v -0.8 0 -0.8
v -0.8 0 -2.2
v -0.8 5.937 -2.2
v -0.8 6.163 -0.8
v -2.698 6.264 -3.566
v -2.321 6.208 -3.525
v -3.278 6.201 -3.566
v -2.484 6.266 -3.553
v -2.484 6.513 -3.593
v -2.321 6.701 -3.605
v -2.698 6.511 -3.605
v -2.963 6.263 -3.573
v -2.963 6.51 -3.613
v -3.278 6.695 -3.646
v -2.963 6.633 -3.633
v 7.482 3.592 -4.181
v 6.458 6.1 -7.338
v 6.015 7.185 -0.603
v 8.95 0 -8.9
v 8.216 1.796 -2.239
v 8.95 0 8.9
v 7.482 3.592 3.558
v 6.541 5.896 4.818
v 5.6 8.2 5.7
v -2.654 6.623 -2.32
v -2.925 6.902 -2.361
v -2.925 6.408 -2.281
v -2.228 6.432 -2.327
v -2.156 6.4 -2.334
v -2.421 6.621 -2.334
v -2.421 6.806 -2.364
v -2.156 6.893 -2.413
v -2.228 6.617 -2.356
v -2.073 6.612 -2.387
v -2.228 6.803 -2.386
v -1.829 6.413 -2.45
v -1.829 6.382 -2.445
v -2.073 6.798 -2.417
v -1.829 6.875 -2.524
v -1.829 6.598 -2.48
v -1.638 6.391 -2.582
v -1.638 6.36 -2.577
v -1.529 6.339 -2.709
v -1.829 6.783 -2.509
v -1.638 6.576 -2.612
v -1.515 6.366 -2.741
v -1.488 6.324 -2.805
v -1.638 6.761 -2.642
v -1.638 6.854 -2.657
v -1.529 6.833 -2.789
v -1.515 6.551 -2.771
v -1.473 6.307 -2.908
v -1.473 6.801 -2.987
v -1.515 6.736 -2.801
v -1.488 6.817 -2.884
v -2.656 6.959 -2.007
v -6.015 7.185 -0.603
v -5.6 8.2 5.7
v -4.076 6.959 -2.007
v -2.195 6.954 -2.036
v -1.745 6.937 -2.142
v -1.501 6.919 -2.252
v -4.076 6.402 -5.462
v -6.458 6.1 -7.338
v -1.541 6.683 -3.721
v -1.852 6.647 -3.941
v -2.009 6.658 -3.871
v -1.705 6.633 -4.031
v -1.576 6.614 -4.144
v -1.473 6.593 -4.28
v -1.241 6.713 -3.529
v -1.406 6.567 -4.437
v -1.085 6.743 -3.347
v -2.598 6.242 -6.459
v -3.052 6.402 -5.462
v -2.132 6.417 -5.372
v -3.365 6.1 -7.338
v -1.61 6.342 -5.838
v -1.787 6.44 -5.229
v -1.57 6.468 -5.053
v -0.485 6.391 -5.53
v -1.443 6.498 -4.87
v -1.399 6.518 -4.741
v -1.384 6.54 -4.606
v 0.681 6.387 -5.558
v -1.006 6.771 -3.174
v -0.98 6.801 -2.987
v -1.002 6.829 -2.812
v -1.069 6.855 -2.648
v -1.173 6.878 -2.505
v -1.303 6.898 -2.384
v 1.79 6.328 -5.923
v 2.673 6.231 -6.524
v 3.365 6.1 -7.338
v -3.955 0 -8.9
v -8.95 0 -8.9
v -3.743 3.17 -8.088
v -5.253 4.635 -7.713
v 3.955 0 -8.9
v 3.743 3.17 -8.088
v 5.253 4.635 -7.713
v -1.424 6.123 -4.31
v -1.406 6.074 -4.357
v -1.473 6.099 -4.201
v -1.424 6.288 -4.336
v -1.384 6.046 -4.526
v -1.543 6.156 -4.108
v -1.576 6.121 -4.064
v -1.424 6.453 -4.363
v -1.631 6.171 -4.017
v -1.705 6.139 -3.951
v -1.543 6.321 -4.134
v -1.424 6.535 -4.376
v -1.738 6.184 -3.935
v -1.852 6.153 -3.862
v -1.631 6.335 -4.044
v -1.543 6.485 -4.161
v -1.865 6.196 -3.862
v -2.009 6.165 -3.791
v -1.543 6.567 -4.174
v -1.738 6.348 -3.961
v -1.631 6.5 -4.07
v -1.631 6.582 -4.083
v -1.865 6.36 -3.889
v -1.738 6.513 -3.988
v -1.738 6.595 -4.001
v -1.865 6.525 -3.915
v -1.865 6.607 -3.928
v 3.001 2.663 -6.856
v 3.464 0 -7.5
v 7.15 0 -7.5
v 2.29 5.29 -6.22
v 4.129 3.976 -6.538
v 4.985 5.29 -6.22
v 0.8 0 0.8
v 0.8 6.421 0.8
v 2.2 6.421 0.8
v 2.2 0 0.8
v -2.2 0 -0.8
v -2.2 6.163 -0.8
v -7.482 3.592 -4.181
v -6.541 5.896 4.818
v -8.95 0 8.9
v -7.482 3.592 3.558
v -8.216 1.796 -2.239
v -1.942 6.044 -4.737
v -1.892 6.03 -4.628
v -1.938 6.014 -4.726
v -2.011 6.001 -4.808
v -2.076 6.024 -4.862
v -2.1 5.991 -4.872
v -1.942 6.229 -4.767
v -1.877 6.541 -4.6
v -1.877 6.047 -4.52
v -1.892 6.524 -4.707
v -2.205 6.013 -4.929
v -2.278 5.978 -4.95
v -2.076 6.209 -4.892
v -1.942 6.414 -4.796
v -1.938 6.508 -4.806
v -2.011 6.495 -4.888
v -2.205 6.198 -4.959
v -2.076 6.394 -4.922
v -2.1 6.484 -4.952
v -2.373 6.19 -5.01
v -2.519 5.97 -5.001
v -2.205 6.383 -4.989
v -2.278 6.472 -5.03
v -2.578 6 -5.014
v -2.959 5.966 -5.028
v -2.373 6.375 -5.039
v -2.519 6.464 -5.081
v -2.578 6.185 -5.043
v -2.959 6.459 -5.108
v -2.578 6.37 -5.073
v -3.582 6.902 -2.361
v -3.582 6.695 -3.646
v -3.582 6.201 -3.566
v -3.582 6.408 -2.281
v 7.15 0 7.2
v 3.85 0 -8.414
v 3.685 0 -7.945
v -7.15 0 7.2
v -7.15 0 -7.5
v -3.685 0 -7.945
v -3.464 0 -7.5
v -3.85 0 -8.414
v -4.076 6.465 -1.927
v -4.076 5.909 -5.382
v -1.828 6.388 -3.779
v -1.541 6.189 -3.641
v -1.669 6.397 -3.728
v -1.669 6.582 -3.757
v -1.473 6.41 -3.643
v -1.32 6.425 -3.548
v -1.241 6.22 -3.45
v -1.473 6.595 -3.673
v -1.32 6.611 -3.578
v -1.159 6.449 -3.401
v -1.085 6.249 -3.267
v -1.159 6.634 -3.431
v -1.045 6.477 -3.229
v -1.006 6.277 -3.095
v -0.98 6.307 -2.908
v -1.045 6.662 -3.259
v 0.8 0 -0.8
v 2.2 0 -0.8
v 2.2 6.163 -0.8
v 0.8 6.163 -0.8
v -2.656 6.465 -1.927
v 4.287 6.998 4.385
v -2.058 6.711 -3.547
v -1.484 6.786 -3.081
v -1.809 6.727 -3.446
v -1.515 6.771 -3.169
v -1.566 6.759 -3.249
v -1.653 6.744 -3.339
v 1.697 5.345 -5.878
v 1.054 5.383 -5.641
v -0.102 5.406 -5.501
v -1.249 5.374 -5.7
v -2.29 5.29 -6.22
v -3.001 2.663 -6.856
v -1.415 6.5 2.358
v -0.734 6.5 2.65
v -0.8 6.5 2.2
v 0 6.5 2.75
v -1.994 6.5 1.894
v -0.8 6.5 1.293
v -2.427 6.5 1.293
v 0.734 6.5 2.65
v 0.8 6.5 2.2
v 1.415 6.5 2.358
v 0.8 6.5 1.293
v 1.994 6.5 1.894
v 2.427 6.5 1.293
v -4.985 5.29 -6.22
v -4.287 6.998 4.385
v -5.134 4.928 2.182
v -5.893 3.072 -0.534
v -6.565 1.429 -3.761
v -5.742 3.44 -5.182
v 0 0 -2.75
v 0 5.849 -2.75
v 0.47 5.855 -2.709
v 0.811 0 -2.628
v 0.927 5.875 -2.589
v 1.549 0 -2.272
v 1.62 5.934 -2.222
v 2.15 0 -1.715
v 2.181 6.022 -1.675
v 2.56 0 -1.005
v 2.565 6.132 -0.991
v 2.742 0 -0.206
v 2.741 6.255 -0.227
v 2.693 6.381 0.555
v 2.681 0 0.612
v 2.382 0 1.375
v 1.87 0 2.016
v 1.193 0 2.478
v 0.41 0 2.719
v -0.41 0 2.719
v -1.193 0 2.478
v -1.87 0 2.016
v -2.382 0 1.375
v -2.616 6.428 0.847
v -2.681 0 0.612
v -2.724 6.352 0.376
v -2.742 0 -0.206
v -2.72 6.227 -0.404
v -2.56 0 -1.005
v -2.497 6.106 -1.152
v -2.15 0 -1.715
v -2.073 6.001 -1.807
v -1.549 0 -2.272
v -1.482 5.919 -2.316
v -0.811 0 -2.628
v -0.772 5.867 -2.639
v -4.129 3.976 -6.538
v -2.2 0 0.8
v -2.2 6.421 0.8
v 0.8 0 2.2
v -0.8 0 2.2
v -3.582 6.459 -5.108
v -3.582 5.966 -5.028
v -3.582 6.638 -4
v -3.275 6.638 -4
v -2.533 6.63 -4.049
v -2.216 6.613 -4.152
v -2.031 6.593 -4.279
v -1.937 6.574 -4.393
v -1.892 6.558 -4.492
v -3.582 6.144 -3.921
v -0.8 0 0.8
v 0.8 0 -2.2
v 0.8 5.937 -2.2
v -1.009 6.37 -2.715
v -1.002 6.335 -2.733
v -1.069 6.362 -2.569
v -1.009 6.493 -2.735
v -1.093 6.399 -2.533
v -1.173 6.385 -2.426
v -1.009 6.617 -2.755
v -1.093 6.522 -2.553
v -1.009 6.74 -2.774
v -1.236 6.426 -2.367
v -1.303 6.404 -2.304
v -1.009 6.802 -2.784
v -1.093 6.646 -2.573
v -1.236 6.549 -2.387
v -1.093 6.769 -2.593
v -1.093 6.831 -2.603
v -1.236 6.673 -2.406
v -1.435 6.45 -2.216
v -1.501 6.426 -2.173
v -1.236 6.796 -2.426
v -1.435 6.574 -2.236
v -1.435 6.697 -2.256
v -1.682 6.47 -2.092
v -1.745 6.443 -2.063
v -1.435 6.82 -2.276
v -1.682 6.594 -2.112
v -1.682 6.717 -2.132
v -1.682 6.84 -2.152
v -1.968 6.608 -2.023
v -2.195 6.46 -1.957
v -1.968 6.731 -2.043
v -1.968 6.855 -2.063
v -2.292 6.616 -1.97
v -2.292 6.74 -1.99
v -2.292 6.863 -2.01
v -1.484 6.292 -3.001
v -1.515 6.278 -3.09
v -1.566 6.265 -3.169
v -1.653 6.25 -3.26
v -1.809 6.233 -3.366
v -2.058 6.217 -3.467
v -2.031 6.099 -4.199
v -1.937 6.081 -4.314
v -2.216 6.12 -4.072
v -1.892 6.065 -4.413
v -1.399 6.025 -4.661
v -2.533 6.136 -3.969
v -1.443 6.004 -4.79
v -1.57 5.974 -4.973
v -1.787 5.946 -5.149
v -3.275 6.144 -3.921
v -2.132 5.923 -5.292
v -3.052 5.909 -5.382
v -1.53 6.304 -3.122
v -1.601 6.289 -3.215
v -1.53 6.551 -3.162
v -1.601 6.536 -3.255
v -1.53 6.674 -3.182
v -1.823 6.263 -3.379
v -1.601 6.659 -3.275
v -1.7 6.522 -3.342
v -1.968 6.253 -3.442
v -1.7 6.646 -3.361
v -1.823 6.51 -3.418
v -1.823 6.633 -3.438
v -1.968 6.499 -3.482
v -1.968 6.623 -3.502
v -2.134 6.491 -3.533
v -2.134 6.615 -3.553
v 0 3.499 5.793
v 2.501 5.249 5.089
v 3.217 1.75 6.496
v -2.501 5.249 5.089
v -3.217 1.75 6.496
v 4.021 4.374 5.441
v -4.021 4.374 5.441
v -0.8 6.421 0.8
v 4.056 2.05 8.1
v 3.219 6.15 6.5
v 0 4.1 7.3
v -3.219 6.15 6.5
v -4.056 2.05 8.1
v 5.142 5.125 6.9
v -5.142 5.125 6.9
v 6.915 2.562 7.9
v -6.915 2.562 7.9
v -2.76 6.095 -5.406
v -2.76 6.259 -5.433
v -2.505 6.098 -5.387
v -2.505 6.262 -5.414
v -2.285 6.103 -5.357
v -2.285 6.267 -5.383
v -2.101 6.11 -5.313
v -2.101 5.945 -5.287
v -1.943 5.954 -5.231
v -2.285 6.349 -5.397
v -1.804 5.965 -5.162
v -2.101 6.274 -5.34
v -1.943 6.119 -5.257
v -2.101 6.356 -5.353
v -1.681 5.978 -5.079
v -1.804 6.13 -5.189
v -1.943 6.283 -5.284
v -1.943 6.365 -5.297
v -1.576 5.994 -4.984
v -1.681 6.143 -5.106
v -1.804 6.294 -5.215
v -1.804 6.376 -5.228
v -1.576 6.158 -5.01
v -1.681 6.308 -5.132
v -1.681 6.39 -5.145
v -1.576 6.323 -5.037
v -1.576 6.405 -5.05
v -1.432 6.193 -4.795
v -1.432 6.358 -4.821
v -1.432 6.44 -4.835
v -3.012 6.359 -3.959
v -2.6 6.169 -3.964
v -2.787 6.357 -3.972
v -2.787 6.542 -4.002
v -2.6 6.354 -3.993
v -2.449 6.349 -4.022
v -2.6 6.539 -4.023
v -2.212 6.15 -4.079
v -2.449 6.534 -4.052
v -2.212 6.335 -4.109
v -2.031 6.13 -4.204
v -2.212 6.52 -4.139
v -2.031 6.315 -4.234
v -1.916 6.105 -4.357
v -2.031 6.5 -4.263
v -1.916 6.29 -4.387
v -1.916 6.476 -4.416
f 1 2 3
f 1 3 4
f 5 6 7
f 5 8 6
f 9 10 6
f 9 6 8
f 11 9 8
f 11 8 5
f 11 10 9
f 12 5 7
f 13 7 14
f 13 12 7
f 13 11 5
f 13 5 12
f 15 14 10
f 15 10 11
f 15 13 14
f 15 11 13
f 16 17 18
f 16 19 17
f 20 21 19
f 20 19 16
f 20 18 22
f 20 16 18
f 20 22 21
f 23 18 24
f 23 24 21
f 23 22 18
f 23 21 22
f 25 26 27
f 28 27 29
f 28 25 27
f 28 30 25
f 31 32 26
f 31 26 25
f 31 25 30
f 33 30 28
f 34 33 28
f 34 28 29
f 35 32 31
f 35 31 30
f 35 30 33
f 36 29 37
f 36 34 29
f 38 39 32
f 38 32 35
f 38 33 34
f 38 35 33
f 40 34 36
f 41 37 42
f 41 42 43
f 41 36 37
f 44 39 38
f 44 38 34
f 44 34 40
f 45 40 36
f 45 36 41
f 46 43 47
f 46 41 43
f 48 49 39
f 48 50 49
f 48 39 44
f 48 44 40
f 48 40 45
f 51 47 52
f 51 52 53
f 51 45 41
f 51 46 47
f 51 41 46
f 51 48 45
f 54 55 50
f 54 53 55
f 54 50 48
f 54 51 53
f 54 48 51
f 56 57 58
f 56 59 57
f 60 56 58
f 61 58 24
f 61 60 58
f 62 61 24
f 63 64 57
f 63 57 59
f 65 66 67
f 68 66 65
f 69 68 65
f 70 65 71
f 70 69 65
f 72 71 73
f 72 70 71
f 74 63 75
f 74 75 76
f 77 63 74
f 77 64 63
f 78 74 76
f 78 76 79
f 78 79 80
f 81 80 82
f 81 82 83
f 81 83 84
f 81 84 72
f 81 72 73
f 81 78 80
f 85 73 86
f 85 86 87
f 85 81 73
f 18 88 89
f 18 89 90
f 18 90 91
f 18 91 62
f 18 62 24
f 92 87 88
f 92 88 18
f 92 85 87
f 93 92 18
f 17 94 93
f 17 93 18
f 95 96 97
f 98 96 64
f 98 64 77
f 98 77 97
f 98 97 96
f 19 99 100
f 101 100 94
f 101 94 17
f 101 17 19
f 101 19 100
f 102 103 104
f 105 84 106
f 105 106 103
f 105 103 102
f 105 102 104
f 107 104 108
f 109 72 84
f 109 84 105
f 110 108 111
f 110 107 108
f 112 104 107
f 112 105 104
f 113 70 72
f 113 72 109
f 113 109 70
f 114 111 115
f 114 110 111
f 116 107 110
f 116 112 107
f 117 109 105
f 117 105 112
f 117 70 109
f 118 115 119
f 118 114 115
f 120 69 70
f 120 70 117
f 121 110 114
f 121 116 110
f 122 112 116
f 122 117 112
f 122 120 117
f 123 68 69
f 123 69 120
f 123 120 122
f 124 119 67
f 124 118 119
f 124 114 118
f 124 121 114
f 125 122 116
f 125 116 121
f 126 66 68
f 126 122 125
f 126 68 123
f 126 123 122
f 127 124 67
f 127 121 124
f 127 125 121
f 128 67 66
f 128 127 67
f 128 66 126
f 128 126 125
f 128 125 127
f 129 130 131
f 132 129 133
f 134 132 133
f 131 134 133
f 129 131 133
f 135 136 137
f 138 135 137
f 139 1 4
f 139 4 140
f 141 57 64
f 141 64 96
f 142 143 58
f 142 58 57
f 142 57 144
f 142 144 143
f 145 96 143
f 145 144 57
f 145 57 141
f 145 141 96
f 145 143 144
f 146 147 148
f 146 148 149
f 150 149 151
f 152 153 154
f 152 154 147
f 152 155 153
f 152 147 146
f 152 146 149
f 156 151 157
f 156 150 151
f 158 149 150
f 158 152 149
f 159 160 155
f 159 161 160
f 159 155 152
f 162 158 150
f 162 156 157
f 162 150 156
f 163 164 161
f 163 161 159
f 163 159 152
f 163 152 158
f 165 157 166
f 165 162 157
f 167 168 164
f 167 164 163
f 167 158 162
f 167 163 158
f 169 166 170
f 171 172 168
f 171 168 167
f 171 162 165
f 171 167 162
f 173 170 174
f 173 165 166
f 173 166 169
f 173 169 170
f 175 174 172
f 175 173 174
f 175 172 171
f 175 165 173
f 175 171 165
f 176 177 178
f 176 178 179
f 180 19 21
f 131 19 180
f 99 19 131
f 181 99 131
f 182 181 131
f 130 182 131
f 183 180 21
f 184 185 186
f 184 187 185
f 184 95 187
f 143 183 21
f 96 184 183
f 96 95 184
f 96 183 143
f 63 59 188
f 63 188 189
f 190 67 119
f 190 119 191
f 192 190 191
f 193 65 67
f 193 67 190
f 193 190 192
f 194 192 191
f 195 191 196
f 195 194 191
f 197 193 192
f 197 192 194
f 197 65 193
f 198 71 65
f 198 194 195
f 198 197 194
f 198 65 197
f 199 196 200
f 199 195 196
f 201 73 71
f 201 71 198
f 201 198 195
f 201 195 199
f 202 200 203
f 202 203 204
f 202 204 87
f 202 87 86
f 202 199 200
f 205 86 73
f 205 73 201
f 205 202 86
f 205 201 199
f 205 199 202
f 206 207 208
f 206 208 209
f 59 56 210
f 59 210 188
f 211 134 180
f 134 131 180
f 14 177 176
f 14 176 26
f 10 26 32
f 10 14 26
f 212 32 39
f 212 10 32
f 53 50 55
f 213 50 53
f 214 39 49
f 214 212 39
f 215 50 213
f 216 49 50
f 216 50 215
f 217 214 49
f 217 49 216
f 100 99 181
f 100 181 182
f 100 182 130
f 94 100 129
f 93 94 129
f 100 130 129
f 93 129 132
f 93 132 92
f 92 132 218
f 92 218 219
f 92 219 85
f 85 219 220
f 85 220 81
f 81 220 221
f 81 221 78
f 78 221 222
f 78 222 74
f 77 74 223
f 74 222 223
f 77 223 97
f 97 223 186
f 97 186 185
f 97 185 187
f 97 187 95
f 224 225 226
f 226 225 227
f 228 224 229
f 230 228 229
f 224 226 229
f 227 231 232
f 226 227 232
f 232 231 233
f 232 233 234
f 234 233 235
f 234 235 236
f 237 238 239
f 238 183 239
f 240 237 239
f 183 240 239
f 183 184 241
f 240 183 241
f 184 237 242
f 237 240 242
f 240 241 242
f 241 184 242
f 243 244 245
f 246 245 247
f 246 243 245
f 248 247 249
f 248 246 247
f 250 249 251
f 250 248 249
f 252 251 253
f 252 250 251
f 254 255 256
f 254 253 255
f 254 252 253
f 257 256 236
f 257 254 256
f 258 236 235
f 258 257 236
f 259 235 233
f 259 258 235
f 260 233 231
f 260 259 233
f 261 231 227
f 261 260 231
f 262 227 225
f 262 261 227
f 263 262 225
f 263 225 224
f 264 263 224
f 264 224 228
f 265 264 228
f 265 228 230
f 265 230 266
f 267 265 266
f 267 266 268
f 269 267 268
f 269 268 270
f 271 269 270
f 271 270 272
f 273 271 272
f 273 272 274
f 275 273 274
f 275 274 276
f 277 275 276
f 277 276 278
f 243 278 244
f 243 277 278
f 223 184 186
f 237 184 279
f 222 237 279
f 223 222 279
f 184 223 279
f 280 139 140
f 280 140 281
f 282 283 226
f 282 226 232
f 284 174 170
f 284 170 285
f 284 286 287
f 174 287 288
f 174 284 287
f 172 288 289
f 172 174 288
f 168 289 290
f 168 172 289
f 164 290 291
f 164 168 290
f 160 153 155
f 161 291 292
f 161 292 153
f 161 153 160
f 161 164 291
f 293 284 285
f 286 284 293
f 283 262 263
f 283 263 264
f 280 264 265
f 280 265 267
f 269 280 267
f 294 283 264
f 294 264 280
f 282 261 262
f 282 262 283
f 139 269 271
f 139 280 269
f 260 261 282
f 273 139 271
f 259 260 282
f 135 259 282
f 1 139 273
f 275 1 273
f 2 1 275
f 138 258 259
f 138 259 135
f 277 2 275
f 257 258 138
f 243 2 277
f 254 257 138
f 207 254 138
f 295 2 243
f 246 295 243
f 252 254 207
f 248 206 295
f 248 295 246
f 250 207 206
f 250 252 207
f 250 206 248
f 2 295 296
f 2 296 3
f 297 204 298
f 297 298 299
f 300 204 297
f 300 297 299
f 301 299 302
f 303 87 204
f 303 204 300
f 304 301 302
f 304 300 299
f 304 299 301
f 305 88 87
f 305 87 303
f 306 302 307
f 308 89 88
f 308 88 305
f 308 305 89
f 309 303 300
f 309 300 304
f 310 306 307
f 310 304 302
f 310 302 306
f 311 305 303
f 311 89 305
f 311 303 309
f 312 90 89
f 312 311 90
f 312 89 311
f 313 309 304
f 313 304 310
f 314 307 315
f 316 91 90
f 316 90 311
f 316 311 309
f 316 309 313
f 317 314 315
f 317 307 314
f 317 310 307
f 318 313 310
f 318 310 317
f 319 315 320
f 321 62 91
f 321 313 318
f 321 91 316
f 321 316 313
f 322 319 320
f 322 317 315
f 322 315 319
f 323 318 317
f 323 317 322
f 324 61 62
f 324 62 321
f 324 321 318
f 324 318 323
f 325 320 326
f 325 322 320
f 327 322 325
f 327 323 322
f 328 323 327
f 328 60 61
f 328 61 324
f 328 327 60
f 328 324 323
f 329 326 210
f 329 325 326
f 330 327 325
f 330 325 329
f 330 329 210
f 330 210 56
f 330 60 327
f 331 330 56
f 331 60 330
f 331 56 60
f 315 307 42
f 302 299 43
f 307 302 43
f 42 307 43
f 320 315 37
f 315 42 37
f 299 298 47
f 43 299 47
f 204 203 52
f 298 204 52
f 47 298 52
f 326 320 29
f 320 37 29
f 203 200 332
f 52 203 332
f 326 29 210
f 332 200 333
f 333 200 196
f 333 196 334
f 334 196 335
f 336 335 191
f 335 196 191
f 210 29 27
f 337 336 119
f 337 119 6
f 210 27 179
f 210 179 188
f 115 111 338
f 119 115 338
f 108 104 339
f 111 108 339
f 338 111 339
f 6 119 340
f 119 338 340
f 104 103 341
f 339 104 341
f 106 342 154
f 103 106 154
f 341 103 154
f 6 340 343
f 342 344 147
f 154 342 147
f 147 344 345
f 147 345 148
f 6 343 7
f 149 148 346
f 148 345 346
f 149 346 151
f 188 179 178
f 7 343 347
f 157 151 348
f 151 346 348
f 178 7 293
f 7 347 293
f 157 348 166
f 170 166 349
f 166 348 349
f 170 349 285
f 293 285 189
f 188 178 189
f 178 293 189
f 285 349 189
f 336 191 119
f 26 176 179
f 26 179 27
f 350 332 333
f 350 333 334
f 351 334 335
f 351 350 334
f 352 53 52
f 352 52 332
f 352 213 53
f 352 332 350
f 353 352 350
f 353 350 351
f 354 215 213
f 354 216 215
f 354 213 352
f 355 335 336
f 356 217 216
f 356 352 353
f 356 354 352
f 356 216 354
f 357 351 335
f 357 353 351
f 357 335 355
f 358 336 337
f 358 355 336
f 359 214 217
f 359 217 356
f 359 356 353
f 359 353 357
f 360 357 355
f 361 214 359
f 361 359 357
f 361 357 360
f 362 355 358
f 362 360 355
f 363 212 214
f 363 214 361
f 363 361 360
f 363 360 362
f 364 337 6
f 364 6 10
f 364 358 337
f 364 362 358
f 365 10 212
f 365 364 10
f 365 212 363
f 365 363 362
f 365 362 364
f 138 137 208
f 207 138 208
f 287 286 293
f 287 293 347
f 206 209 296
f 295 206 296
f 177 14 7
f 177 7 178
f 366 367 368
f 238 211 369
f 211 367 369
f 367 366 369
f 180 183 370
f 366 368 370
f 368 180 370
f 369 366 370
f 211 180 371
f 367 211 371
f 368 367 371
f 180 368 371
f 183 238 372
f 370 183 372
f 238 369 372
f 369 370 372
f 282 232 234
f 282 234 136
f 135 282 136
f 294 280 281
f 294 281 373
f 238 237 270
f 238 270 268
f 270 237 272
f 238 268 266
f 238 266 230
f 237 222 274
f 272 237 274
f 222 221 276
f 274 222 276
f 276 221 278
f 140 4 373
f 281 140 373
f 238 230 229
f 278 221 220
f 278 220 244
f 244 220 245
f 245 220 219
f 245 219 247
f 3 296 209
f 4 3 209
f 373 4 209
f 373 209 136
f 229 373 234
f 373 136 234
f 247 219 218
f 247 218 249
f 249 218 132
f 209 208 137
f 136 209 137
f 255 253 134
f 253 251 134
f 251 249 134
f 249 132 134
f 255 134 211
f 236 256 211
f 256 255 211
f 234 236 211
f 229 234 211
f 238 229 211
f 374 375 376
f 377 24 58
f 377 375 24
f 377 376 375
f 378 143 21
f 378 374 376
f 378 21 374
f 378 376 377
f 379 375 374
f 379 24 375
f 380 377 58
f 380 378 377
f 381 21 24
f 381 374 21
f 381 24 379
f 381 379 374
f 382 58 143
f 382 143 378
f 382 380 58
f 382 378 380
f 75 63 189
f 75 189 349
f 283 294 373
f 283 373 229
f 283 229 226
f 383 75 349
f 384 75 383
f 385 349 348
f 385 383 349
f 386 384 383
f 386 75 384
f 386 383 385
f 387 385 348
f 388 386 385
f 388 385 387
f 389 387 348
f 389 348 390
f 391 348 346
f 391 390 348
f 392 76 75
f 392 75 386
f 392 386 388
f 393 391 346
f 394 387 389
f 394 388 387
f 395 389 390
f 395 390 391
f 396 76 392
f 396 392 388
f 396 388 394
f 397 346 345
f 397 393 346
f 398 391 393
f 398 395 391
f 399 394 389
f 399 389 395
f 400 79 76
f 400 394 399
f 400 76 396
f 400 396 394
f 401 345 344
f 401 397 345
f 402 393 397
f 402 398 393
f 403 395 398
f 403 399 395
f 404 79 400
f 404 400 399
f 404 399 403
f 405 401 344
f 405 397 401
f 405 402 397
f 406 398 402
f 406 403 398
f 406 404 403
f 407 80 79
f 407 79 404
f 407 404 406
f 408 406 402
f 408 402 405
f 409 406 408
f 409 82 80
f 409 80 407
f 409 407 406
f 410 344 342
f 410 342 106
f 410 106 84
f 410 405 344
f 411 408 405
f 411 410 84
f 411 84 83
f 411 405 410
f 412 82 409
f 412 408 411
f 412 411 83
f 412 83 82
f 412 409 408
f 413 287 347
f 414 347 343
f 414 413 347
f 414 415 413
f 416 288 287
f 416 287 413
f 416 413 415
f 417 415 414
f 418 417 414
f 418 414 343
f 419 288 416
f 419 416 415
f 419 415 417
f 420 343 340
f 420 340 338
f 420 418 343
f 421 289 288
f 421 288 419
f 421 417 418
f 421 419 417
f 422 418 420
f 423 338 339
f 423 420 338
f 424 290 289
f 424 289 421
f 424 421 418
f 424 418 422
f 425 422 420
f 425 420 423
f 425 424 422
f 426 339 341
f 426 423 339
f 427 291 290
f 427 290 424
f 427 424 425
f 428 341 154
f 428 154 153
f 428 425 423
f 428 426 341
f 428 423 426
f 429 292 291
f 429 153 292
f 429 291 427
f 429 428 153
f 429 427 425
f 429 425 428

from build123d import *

# Parameters (mm, degrees)
OTHER_START         = 7.189240539
OTHER_2_OUTLINE_W   = 16
OTHER_2_OUTLINE_H   = 16
OTHER_2_DEPTH       = 1.9877561
SKETCH_20_R         = 2.75
EXTRUDE_2_DEPTH     = 6.5
CUT_EXTRUDE_1_DEPTH = 0.5
SKETCH_22_R         = 4
CUT_EXTRUDE_2_DEPTH = 7.5


# Read off the part's stored shape, not the designer's step: 相交2
with BuildPart() as part:
    # 草图4 → Loft 1 section 0
    with BuildSketch(Plane(origin=(0, 8.2, 0), x_dir=(1, 0, 0), z_dir=(0, 1, 0))):
        with BuildLine():
            Line((-5.6, 6.8), (5.6, 6.8))
            Line((5.6, 6.8), (5.6, -5.7))
            Line((5.6, -5.7), (-5.6, -5.7))
            Line((-5.6, -5.7), (-5.6, 6.8))
        make_face()
    # 草图1 → Loft 1 section 1
    with BuildSketch(Plane(origin=(0, 0, 0), x_dir=(1, 0, 0), z_dir=(0, 1, 0))):
        with BuildLine():
            Line((-8.95, -8.9), (8.95, -8.9))
            Line((8.95, -8.9), (8.95, 8.9))
            Line((8.95, 8.9), (-8.95, 8.9))
            Line((-8.95, 8.9), (-8.95, -8.9))
        make_face()
    loft()

    # 相交2 outline → 相交2 (cut)
    with BuildSketch(Plane(origin=(0, 0, 0), x_dir=(1, 0, 0), z_dir=(0, 0.9872752829851917, -0.15902048800865198)).offset(OTHER_START)):
        Rectangle(OTHER_2_OUTLINE_W, OTHER_2_OUTLINE_H)
    extrude(amount=OTHER_2_DEPTH, mode=Mode.SUBTRACT)

    # 草图19 → Loft 1 2 section 0
    with BuildSketch(Plane(origin=(0, 6.132664073, -0.987788564), x_dir=(1, 0, 0), z_dir=(0, 0.9872752829851916, -0.15902048800865207))):
        with BuildLine():
            Line((-4.985089723, 5.299749211), (4.985089723, 5.299749211))
            Line((4.985089723, 5.299749211), (4.287230721, -5.442213697))
            Line((4.287230721, -5.442213697), (-4.287230721, -5.442213697))
            Line((-4.287230721, -5.442213697), (-4.985089723, 5.299749211))
        make_face()
    # 草图8 → Loft 1 2 section 1
    with BuildSketch(Plane.XZ):
        with BuildLine():
            Line((-7.15, 7.2), (7.15, 7.2))
            Line((7.15, 7.2), (7.15, -7.5))
            Line((7.15, -7.5), (-7.15, -7.5))
            Line((-7.15, -7.5), (-7.15, 7.2))
        make_face()
    loft(mode=Mode.SUBTRACT)

    # 草图20 → 凸台-拉伸2 (add)
    with BuildSketch(Plane.XZ):
        with Locations(Location((0, 0, 0), (0, 0, 270))):
            Circle(SKETCH_20_R)
        Polygon((-2.2, 0.8), (-0.8, 0.8), (-0.8, 2.2), (0.8, 2.2), (0.8, 0.8), (2.2, 0.8), (2.2, -0.8), (0.8, -0.8), (0.8, -2.2), (-0.8, -2.2), (-0.8, -0.8), (-2.2, -0.8), align=None, mode=Mode.SUBTRACT)
    extrude(amount=-EXTRUDE_2_DEPTH)

    # 草图21 → 切除-拉伸1 (cut)
    with BuildSketch(Plane(origin=(0, 7.097759487, -1.143236539), x_dir=(1, 0, 0), z_dir=(0, 0.9872752829851916, -0.15902048800865207))):
        with BuildLine():
            Line((-4.075955723, 4.374408411), (-3.05161678, 4.374408411))
            add(Edge.make_bspline(
                [(-3.05161678, 4.374408411), (-3.001598177, 4.37422557), (-2.904339475, 4.373870045), (-2.763152441, 4.368665036), (-2.630787829, 4.361353255), (-2.507581664, 4.350074843), (-2.393003416, 4.336098995), (-2.287386768, 4.319759613), (-2.190702321, 4.299464771), (-2.102553843, 4.275462633), (-2.02069076, 4.248417722), (-1.944052325, 4.218671859), (-1.871820937, 4.185226888), (-1.803585437, 4.149371864), (-1.740597017, 4.107930824), (-1.680956816, 4.065216099), (-1.626276856, 4.018102997), (-1.576276747, 3.968254753), (-1.53138788, 3.915631236), (-1.491980376, 3.861504021), (-1.458087704, 3.806449275), (-1.43097458, 3.749274429), (-1.410270719, 3.690673858), (-1.394505384, 3.630718089), (-1.385098589, 3.56935381), (-1.384133592, 3.527952708), (-1.38364803, 3.50712075)],
                knots=[0, 0, 0, 0, 1.727133696, 3.358326119, 4.878149777, 6.304391432, 7.629726349, 8.863648063, 9.993787461, 11.039234741, 12.016682314, 12.969840003, 13.87620352, 14.764420512, 15.628515143, 16.477592799, 17.296048855, 18.117800747, 18.913499522, 19.681881416, 20.427899323, 21.142662237, 21.862509911, 22.571095379, 23.281012387, 24, 24, 24, 24], degree=3))
            add(Edge.make_bspline(
                [(-1.38364803, 3.50712075), (-1.385412282, 3.468348204), (-1.388910839, 3.391461246), (-1.42095224, 3.279461488), (-1.471320058, 3.173101493), (-1.529107281, 3.090495822), (-1.584691676, 3.028842776), (-1.631123728, 2.983643069), (-1.682562114, 2.940920335), (-1.738589565, 2.900102161), (-1.799873027, 2.862563579), (-1.865299808, 2.826587473), (-1.935344564, 2.793012224), (-1.98417587, 2.77281639), (-2.009048671, 2.762529404)],
                knots=[0, 0, 0, 0, 1.344649222, 2.666474061, 4.014062304, 5.41970358, 6.150026244, 6.896555969, 7.669043806, 8.471425933, 9.302905494, 10.164184025, 11.06490551, 12, 12, 12, 12], degree=3))
            add(Edge.make_bspline(
                [(-2.009048671, 2.762529404), (-1.977920981, 2.754996611), (-1.917306862, 2.740328204), (-1.829559386, 2.715932573), (-1.747632696, 2.689342975), (-1.670272781, 2.664549503), (-1.599588756, 2.635500242), (-1.533515625, 2.608342187), (-1.473506413, 2.578504898), (-1.401750644, 2.538013126), (-1.320454432, 2.484098783), (-1.232731939, 2.412990017), (-1.157794968, 2.334214687), (-1.093935011, 2.249817411), (-1.043468641, 2.160184049), (-1.006060497, 2.066312746), (-0.983696742, 1.968275226), (-0.981102992, 1.901429924), (-0.979801877, 1.867897994)],
                knots=[0, 0, 0, 0, 1.040401352, 2.025945749, 2.957610977, 3.838748948, 4.663524247, 5.439134026, 6.158967321, 6.838896101, 8.114975742, 9.323328772, 10.499359089, 11.638211642, 12.753227844, 13.830378753, 14.911642469, 16, 16, 16, 16], degree=3))
            add(Edge.make_bspline(
                [(-0.979801877, 1.867897994), (-0.981029473, 1.833646659), (-0.983459912, 1.765834667), (-1.006577059, 1.666832464), (-1.041459332, 1.571612689), (-1.09229665, 1.480899499), (-1.157707146, 1.394733239), (-1.235753214, 1.311173804), (-1.329676927, 1.233761622), (-1.435446571, 1.159592435), (-1.553929285, 1.092855208), (-1.682429672, 1.03354565), (-1.821434347, 0.984996199), (-1.969653473, 0.944188002), (-2.12762314, 0.912897118), (-2.295317391, 0.890925288), (-2.472464022, 0.876289135), (-2.593987323, 0.875045113), (-2.656184088, 0.874408411)],
                knots=[0, 0, 0, 0, 0.763794375, 1.512186817, 2.258665885, 3.022620734, 3.824296693, 4.669829699, 5.569978408, 6.537158664, 7.551586153, 8.60252133, 9.69369207, 10.835799672, 12.033384994, 13.286741793, 14.611328995, 16, 16, 16, 16], degree=3))
            Line((-2.656184088, 0.874408411), (-4.075955723, 0.874408411))
            Line((-4.075955723, 0.874408411), (-4.075955723, 4.374408411))
        make_face()
        with BuildLine():
            Line((-3.582365979, 4.015434052), (-3.582365979, 2.89363918))
            Line((-3.582365979, 2.89363918), (-3.274573511, 2.89363918))
            add(Edge.make_bspline(
                [(-3.274573511, 2.89363918), (-3.229234608, 2.894037102), (-3.14182053, 2.894804303), (-3.015329988, 2.897035757), (-2.898263152, 2.903171565), (-2.790415727, 2.909495423), (-2.6919831, 2.919395843), (-2.602964895, 2.931479837), (-2.522737381, 2.944078774), (-2.43017236, 2.965548195), (-2.325916803, 2.996637022), (-2.213810068, 3.045984254), (-2.114923061, 3.104045743), (-2.031417989, 3.172044051), (-1.963132903, 3.246655866), (-1.913980137, 3.327274535), (-1.882872139, 3.412615332), (-1.879120194, 3.471344935), (-1.877237774, 3.500810654)],
                knots=[0, 0, 0, 0, 1.300077838, 2.506569319, 3.626932325, 4.661071425, 5.603901159, 6.462528421, 7.236988455, 7.931124199, 9.1859622, 10.350118682, 11.434989577, 12.463773904, 13.427075439, 14.32002997, 15.157128221, 16, 16, 16, 16], degree=3))
            add(Edge.make_bspline(
                [(-1.877237774, 3.500810654), (-1.878090356, 3.52026362), (-1.879770849, 3.558606611), (-1.891776361, 3.614572779), (-1.912652517, 3.667069895), (-1.94078659, 3.716733169), (-1.977847183, 3.762720595), (-2.023432155, 3.804723671), (-2.076216593, 3.844102145), (-2.137282697, 3.880116871), (-2.20703143, 3.912207698), (-2.286219485, 3.940566317), (-2.375213143, 3.962587503), (-2.473301087, 3.982952277), (-2.581178984, 3.996632495), (-2.698498063, 4.008322574), (-2.825561166, 4.014251811), (-2.913491199, 4.015030452), (-2.959068703, 4.015434052)],
                knots=[0, 0, 0, 0, 0.704770075, 1.389145107, 2.062265897, 2.745067049, 3.450040637, 4.193008615, 4.985718742, 5.832502292, 6.757032351, 7.764250842, 8.87554471, 10.07639704, 11.392709723, 12.81352688, 14.348328909, 16, 16, 16, 16], degree=3))
            Line((-2.959068703, 4.015434052), (-3.582365979, 4.015434052))
        make_face(mode=Mode.SUBTRACT)
        with BuildLine():
            Line((-3.582365979, 2.534664821), (-3.582365979, 1.23338277))
            Line((-3.582365979, 1.23338277), (-2.925414857, 1.23338277))
            add(Edge.make_bspline(
                [(-2.925414857, 1.23338277), (-2.87843879, 1.233762727), (-2.787984434, 1.23449435), (-2.657071337, 1.236961408), (-2.535944574, 1.242321818), (-2.424505301, 1.251162574), (-2.322676057, 1.260268307), (-2.230585111, 1.273130598), (-2.148143507, 1.287369469), (-2.052767711, 1.309568231), (-1.945828922, 1.343476113), (-1.829800232, 1.395799803), (-1.726263469, 1.457063537), (-1.638169932, 1.52937046), (-1.565540416, 1.607250263), (-1.512850304, 1.69077302), (-1.479720256, 1.778095564), (-1.47548575, 1.838182595), (-1.47339162, 1.867897994)],
                knots=[0, 0, 0, 0, 1.29843179, 2.500184008, 3.618878599, 4.648866362, 5.589855277, 6.444005784, 7.218207981, 7.901363496, 9.149526468, 10.311741131, 11.4128985, 12.464137763, 13.451792752, 14.342600541, 15.180350819, 16, 16, 16, 16], degree=3))
            add(Edge.make_bspline(
                [(-1.47339162, 1.867897994), (-1.474057939, 1.886411489), (-1.475384595, 1.923272276), (-1.486301385, 1.977500806), (-1.503895793, 2.030194167), (-1.529359322, 2.080409977), (-1.561622114, 2.129090654), (-1.600943659, 2.175575902), (-1.646816465, 2.221086121), (-1.700338495, 2.263107634), (-1.758970648, 2.304010862), (-1.82377859, 2.341171111), (-1.893956852, 2.374278996), (-1.96876264, 2.405798633), (-2.049273018, 2.432646906), (-2.135127862, 2.4566183), (-2.226255262, 2.476740829), (-2.288984721, 2.487698036), (-2.32104787, 2.493298635)],
                knots=[0, 0, 0, 0, 0.77785496, 1.548726791, 2.316271961, 3.107298279, 3.908573286, 4.766644542, 5.663022547, 6.620650135, 7.623734104, 8.66706768, 9.757067915, 10.884860646, 12.078135655, 13.322666349, 14.631524187, 16, 16, 16, 16], degree=3))
            add(Edge.make_bspline(
                [(-2.32104787, 2.493298635), (-2.346033301, 2.496750191), (-2.400093694, 2.504218241), (-2.488058336, 2.512220196), (-2.588577808, 2.519174973), (-2.701968389, 2.52441673), (-2.827916954, 2.529782033), (-2.96677814, 2.531897127), (-3.1182147, 2.534390125), (-3.223390168, 2.534570849), (-3.27807912, 2.534664821)],
                knots=[0, 0, 0, 0, 0.631419024, 1.366186615, 2.21079442, 3.154006331, 4.208025658, 5.366807578, 6.630797325, 8, 8, 8, 8], degree=3))
            Line((-3.27807912, 2.534664821), (-3.582365979, 2.534664821))
        make_face(mode=Mode.SUBTRACT)
    extrude(amount=-CUT_EXTRUDE_1_DEPTH, mode=Mode.SUBTRACT)

    # 草图22 → 切除-拉伸2 (cut)
    with BuildSketch(Plane.XZ):
        with Locations((0, -9.5)):
            Circle(SKETCH_22_R)
    extrude(amount=-CUT_EXTRUDE_2_DEPTH, mode=Mode.SUBTRACT)


solid = part.part
